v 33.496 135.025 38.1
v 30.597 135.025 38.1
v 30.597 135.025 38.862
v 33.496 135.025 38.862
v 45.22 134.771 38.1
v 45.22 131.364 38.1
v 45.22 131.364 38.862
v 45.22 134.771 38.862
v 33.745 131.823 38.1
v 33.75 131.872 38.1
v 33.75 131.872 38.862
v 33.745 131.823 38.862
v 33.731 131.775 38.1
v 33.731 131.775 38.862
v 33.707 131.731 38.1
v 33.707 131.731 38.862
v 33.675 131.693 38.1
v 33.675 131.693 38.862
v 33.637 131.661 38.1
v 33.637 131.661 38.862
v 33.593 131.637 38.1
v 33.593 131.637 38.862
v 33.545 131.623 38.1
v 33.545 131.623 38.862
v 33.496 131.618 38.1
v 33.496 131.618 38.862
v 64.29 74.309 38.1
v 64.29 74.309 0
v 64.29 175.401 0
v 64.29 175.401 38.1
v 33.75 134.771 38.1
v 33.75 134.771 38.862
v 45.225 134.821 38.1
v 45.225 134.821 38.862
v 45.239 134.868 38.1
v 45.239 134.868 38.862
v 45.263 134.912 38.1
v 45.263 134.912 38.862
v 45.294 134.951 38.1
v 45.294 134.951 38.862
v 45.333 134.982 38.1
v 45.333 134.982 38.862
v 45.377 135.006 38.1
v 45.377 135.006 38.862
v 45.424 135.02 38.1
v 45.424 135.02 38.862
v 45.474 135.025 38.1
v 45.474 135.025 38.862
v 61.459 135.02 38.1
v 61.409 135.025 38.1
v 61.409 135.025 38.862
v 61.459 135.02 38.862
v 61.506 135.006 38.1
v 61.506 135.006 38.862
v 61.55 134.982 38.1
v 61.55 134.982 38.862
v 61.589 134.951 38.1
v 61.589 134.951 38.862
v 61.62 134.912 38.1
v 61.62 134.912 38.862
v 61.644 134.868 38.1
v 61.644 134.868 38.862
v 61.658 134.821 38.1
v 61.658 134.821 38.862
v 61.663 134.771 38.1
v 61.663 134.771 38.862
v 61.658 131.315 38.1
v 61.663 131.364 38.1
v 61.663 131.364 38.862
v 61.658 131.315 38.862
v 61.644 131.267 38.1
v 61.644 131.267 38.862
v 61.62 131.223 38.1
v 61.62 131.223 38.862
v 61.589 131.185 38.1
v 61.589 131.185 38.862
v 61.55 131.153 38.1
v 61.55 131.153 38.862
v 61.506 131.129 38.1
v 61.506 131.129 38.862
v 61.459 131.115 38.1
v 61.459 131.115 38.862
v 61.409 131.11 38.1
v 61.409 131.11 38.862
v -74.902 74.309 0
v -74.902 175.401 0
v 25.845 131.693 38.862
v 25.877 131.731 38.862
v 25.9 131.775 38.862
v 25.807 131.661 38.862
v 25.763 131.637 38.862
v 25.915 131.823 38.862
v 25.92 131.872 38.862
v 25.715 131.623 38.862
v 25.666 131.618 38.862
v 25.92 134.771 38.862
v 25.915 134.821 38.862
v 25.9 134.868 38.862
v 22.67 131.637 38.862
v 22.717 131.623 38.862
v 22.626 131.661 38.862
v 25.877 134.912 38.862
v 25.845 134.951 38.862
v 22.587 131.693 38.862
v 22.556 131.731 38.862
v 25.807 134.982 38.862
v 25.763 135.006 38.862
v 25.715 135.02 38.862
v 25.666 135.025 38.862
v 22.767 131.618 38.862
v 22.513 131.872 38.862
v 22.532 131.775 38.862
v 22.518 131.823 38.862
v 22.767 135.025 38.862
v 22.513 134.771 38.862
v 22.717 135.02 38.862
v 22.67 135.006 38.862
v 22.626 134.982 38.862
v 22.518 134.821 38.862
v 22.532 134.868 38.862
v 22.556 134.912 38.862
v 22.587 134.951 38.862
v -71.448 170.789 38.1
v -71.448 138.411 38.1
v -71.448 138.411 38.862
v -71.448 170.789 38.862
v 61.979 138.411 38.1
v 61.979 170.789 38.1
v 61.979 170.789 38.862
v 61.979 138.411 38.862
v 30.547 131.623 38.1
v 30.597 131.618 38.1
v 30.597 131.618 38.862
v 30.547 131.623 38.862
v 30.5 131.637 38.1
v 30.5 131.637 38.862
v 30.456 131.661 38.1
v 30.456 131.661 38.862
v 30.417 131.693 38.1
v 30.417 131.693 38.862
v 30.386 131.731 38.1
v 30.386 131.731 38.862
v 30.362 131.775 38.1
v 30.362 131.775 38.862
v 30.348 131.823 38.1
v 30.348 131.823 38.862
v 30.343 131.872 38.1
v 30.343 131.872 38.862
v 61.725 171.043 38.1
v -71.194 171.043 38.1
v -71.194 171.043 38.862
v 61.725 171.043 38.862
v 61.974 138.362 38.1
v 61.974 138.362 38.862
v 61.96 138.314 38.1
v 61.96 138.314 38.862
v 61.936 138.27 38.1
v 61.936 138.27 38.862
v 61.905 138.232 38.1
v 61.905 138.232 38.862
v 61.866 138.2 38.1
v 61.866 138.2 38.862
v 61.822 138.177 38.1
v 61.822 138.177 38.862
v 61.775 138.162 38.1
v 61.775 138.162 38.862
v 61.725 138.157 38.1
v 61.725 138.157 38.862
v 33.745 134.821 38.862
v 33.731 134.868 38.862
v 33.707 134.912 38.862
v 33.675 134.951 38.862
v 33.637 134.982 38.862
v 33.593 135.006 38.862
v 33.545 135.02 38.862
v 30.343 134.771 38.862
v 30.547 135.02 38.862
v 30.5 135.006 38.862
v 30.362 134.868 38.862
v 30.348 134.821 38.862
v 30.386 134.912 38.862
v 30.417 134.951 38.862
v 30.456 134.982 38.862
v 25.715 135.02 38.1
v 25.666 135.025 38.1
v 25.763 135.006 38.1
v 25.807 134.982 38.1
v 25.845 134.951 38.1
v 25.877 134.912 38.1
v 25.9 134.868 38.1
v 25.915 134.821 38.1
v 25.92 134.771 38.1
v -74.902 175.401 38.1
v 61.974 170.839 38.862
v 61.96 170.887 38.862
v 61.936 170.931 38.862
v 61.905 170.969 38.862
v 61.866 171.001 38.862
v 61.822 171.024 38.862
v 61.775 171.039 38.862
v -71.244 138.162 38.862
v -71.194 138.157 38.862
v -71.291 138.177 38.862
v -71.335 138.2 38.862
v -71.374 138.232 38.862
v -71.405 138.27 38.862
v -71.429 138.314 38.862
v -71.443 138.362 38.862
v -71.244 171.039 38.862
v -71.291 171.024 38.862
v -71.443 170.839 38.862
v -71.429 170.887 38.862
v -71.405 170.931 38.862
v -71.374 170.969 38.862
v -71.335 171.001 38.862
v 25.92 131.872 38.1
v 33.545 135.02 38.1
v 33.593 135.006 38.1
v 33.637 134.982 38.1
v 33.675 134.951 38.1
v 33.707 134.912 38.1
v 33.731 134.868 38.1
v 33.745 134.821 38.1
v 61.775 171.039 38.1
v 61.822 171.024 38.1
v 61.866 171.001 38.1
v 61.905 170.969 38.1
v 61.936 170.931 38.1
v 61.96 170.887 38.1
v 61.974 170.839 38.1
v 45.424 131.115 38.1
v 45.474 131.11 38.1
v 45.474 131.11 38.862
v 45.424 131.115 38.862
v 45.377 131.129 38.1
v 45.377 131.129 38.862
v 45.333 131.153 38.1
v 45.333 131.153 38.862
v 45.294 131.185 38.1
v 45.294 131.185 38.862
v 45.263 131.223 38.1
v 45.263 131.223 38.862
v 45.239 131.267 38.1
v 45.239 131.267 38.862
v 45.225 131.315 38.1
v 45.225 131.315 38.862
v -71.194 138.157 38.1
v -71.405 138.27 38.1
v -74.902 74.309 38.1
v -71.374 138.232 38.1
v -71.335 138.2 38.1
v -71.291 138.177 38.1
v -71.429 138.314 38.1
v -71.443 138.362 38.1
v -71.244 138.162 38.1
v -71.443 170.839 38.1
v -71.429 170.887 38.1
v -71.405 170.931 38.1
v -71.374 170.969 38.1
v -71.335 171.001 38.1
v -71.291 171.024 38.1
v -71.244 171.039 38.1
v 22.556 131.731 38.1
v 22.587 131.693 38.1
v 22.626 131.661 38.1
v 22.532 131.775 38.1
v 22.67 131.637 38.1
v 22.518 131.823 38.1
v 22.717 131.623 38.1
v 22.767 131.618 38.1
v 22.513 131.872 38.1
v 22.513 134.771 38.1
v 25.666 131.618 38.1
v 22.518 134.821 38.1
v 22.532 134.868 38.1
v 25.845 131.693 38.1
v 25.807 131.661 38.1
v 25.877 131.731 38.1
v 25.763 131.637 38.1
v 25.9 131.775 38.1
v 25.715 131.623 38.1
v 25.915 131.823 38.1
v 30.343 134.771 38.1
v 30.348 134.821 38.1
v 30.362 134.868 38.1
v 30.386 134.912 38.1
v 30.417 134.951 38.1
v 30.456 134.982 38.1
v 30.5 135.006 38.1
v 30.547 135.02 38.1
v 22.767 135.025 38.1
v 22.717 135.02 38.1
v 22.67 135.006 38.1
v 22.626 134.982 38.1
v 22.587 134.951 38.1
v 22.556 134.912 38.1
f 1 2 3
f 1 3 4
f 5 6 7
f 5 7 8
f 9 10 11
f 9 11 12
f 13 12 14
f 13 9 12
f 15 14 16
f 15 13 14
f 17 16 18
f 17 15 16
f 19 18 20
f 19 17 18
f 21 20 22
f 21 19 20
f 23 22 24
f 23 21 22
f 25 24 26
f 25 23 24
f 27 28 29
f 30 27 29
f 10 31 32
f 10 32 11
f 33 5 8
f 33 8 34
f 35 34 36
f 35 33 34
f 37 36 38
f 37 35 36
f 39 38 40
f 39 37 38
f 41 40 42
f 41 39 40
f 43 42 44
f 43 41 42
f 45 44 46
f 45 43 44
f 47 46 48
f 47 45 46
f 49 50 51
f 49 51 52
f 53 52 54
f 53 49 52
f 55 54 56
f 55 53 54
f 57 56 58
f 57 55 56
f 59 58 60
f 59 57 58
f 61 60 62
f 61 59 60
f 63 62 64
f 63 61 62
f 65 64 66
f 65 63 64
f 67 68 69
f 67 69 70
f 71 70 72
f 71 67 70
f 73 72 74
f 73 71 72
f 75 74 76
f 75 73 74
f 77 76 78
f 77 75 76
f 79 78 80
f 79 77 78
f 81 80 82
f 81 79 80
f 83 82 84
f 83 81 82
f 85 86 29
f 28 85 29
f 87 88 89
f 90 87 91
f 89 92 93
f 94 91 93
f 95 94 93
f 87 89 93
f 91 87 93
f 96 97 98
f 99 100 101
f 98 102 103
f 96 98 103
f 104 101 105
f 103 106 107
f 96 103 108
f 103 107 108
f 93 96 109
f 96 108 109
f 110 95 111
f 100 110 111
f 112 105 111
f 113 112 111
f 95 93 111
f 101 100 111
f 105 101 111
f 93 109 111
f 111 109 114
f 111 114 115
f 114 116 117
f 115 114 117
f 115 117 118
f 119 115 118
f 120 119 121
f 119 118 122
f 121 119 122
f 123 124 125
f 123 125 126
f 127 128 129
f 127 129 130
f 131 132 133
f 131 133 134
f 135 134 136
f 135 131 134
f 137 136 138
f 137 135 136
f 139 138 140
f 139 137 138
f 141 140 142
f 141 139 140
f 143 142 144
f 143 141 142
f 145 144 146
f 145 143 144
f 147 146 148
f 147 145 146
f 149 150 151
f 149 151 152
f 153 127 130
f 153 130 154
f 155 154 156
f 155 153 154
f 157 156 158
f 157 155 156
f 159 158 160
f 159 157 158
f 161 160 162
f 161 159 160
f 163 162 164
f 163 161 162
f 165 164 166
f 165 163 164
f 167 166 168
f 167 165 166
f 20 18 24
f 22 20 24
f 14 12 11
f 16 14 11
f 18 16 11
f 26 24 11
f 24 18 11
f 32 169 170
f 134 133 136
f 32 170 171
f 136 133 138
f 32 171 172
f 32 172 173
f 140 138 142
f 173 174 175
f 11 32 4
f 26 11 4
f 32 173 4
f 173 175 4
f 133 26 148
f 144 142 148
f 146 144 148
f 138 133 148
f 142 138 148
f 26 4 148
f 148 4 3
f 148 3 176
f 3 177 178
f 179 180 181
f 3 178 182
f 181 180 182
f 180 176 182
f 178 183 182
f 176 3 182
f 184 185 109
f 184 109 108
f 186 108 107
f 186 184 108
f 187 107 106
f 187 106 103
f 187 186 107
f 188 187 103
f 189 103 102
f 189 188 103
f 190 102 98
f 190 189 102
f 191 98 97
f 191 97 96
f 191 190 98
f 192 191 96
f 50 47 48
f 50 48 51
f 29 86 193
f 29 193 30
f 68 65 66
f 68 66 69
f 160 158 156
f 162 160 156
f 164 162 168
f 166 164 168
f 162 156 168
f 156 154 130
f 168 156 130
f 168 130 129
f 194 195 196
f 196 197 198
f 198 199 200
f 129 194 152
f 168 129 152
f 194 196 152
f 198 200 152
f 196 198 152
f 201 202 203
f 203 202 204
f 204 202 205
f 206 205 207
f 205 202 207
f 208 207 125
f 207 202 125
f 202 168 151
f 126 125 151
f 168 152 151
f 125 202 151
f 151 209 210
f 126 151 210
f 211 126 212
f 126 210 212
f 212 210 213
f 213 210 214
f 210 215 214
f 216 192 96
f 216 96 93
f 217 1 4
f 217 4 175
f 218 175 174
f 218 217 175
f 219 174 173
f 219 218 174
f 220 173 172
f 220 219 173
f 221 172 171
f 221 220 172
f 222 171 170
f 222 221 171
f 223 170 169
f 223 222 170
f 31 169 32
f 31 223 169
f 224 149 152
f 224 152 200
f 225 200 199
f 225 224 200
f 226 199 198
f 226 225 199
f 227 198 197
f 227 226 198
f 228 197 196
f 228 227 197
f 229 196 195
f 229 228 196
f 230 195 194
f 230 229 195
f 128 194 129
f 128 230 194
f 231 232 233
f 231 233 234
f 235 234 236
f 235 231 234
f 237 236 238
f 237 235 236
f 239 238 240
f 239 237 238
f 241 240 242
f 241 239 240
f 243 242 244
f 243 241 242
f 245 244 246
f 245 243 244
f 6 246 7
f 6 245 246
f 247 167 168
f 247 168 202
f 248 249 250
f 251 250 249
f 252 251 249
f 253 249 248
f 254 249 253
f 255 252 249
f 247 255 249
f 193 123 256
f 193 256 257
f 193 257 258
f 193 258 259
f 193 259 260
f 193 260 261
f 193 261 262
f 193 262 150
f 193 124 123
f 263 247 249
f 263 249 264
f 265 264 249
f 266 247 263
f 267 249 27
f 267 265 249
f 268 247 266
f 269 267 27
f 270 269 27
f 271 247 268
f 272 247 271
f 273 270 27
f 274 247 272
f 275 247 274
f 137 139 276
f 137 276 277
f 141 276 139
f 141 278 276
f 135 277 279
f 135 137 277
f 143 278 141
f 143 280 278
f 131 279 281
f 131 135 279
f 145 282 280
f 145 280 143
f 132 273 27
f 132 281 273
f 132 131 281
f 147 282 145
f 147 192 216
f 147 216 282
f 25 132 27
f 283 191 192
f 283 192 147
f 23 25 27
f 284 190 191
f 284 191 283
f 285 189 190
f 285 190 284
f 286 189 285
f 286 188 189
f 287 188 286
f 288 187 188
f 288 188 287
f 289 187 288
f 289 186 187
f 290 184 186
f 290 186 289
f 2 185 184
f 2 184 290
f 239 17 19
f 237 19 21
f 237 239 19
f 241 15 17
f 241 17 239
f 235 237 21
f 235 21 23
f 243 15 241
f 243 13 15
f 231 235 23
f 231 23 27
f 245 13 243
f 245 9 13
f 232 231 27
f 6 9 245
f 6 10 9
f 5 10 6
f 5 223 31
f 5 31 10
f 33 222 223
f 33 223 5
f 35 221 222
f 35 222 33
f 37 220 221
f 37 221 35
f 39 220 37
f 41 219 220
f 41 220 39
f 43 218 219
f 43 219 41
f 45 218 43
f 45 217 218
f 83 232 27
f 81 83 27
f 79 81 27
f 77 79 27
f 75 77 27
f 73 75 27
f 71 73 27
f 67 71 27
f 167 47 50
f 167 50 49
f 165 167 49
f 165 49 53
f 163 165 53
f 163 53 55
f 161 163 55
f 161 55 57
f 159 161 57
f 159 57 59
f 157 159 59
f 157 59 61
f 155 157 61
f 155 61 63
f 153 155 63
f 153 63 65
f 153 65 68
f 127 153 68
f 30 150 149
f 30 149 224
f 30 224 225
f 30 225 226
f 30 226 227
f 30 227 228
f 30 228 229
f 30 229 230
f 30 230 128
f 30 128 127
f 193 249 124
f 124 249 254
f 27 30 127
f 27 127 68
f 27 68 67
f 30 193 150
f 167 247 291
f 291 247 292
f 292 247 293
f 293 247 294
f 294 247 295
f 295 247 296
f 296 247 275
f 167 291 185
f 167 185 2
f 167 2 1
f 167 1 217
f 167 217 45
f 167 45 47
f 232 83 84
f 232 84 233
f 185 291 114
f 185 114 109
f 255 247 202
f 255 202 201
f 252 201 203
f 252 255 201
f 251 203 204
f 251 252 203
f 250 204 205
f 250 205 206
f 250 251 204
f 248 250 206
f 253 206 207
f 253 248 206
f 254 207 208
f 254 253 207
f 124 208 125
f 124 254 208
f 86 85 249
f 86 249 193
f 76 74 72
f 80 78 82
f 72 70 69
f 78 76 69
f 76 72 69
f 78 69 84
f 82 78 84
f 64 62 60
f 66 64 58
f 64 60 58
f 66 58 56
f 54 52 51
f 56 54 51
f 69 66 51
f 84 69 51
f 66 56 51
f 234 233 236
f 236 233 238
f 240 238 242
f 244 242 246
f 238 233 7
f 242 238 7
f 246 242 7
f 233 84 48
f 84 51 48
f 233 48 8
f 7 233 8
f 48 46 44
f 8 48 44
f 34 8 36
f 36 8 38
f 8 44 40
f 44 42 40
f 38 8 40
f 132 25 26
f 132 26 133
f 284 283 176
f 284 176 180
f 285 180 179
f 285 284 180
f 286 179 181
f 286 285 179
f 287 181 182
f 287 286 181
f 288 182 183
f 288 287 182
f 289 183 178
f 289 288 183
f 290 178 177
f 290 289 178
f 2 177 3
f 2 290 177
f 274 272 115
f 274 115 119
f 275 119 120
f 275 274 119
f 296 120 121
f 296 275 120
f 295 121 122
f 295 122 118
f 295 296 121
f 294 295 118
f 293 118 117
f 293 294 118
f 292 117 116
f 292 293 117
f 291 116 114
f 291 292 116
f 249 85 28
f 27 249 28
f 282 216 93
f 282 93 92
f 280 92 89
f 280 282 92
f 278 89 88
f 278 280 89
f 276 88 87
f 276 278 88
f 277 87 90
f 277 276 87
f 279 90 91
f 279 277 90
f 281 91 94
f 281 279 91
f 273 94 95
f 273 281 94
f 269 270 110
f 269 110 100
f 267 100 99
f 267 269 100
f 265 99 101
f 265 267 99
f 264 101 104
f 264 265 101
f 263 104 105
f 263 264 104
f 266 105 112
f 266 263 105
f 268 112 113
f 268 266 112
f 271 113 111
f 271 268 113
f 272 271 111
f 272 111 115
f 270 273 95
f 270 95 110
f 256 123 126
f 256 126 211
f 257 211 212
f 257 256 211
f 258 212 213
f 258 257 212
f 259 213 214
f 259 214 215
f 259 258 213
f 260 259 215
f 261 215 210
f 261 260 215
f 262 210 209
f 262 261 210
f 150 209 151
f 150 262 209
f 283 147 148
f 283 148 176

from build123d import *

# Parameters (mm, degrees)
SKETCH1_W           = 139.192
SKETCH1_H           = 101.092
BASE_EXTRUDE_DEPTH  = 38.1
BOSS_EXTRUDE1_DEPTH = 0.762


with BuildPart() as part:
    # Sketch1 → Base-Extrude (new body)
    with BuildSketch(Plane.XY):
        with Locations((-5.306370086, 124.85517785)):
            Rectangle(SKETCH1_W, SKETCH1_H)
    extrude(amount=BASE_EXTRUDE_DEPTH)

    # Sketch2 → Boss-Extrude1 (add)
    with BuildSketch(Plane.XY.offset(38.1)):
        with BuildLine():
            Line((-71.194022628, 171.043454179), (61.725007309, 171.043454179))
            ThreePointArc((61.725007309, 171.043454179), (61.904612432, 170.969059301), (61.979007309, 170.789454179))
            Line((61.979007309, 170.789454179), (61.979007309, 138.411180808))
            ThreePointArc((61.979007309, 138.411180808), (61.904612432, 138.231575686), (61.725007309, 138.157180808))
            Line((61.725007309, 138.157180808), (-71.194022628, 138.157180808))
            ThreePointArc((-71.194022628, 138.157180808), (-71.373627751, 138.231575686), (-71.448022628, 138.411180808))
            Line((-71.448022628, 138.411180808), (-71.448022628, 170.789454179))
            ThreePointArc((-71.448022628, 170.789454179), (-71.373627751, 170.969059301), (-71.194022628, 171.043454179))
        make_face()
        with BuildLine():
            Line((45.473947187, 135.025154773), (61.409083872, 135.025154773))
            ThreePointArc((61.409083872, 135.025154773), (61.588688995, 134.950759895), (61.663083872, 134.771154773))
            Line((61.663083872, 134.771154773), (61.663083872, 131.364122229))
            ThreePointArc((61.663083872, 131.364122229), (61.588688995, 131.184517106), (61.409083872, 131.110122229))
            Line((61.409083872, 131.110122229), (45.473947187, 131.110122229))
            ThreePointArc((45.473947187, 131.110122229), (45.294342065, 131.184517106), (45.219947187, 131.364122229))
            Line((45.219947187, 131.364122229), (45.219947187, 134.771154773))
            ThreePointArc((45.219947187, 134.771154773), (45.294342065, 134.950759895), (45.473947187, 135.025154773))
        make_face()
        with BuildLine():
            Line((22.766758431, 135.025154773), (25.665790975, 135.025154773))
            ThreePointArc((25.665790975, 135.025154773), (25.845396098, 134.950759895), (25.919790975, 134.771154773))
            Line((25.919790975, 134.771154773), (25.919790975, 131.872122229))
            ThreePointArc((25.919790975, 131.872122229), (25.845396098, 131.692517106), (25.665790975, 131.618122229))
            Line((25.665790975, 131.618122229), (22.766758431, 131.618122229))
            ThreePointArc((22.766758431, 131.618122229), (22.587153309, 131.692517106), (22.512758431, 131.872122229))
            Line((22.512758431, 131.872122229), (22.512758431, 134.771154773))
            ThreePointArc((22.512758431, 134.771154773), (22.587153309, 134.950759895), (22.766758431, 135.025154773))
        make_face()
        with BuildLine():
            Line((30.596823519, 135.025154773), (33.495856063, 135.025154773))
            ThreePointArc((33.495856063, 135.025154773), (33.675461186, 134.950759895), (33.749856063, 134.771154773))
            Line((33.749856063, 134.771154773), (33.749856063, 131.872122229))
            ThreePointArc((33.749856063, 131.872122229), (33.675461186, 131.692517106), (33.495856063, 131.618122229))
            Line((33.495856063, 131.618122229), (30.596823519, 131.618122229))
            ThreePointArc((30.596823519, 131.618122229), (30.417218397, 131.692517106), (30.342823519, 131.872122229))
            Line((30.342823519, 131.872122229), (30.342823519, 134.771154773))
            ThreePointArc((30.342823519, 134.771154773), (30.417218397, 134.950759895), (30.596823519, 135.025154773))
        make_face()
    extrude(amount=BOSS_EXTRUDE1_DEPTH)


solid = part.part
